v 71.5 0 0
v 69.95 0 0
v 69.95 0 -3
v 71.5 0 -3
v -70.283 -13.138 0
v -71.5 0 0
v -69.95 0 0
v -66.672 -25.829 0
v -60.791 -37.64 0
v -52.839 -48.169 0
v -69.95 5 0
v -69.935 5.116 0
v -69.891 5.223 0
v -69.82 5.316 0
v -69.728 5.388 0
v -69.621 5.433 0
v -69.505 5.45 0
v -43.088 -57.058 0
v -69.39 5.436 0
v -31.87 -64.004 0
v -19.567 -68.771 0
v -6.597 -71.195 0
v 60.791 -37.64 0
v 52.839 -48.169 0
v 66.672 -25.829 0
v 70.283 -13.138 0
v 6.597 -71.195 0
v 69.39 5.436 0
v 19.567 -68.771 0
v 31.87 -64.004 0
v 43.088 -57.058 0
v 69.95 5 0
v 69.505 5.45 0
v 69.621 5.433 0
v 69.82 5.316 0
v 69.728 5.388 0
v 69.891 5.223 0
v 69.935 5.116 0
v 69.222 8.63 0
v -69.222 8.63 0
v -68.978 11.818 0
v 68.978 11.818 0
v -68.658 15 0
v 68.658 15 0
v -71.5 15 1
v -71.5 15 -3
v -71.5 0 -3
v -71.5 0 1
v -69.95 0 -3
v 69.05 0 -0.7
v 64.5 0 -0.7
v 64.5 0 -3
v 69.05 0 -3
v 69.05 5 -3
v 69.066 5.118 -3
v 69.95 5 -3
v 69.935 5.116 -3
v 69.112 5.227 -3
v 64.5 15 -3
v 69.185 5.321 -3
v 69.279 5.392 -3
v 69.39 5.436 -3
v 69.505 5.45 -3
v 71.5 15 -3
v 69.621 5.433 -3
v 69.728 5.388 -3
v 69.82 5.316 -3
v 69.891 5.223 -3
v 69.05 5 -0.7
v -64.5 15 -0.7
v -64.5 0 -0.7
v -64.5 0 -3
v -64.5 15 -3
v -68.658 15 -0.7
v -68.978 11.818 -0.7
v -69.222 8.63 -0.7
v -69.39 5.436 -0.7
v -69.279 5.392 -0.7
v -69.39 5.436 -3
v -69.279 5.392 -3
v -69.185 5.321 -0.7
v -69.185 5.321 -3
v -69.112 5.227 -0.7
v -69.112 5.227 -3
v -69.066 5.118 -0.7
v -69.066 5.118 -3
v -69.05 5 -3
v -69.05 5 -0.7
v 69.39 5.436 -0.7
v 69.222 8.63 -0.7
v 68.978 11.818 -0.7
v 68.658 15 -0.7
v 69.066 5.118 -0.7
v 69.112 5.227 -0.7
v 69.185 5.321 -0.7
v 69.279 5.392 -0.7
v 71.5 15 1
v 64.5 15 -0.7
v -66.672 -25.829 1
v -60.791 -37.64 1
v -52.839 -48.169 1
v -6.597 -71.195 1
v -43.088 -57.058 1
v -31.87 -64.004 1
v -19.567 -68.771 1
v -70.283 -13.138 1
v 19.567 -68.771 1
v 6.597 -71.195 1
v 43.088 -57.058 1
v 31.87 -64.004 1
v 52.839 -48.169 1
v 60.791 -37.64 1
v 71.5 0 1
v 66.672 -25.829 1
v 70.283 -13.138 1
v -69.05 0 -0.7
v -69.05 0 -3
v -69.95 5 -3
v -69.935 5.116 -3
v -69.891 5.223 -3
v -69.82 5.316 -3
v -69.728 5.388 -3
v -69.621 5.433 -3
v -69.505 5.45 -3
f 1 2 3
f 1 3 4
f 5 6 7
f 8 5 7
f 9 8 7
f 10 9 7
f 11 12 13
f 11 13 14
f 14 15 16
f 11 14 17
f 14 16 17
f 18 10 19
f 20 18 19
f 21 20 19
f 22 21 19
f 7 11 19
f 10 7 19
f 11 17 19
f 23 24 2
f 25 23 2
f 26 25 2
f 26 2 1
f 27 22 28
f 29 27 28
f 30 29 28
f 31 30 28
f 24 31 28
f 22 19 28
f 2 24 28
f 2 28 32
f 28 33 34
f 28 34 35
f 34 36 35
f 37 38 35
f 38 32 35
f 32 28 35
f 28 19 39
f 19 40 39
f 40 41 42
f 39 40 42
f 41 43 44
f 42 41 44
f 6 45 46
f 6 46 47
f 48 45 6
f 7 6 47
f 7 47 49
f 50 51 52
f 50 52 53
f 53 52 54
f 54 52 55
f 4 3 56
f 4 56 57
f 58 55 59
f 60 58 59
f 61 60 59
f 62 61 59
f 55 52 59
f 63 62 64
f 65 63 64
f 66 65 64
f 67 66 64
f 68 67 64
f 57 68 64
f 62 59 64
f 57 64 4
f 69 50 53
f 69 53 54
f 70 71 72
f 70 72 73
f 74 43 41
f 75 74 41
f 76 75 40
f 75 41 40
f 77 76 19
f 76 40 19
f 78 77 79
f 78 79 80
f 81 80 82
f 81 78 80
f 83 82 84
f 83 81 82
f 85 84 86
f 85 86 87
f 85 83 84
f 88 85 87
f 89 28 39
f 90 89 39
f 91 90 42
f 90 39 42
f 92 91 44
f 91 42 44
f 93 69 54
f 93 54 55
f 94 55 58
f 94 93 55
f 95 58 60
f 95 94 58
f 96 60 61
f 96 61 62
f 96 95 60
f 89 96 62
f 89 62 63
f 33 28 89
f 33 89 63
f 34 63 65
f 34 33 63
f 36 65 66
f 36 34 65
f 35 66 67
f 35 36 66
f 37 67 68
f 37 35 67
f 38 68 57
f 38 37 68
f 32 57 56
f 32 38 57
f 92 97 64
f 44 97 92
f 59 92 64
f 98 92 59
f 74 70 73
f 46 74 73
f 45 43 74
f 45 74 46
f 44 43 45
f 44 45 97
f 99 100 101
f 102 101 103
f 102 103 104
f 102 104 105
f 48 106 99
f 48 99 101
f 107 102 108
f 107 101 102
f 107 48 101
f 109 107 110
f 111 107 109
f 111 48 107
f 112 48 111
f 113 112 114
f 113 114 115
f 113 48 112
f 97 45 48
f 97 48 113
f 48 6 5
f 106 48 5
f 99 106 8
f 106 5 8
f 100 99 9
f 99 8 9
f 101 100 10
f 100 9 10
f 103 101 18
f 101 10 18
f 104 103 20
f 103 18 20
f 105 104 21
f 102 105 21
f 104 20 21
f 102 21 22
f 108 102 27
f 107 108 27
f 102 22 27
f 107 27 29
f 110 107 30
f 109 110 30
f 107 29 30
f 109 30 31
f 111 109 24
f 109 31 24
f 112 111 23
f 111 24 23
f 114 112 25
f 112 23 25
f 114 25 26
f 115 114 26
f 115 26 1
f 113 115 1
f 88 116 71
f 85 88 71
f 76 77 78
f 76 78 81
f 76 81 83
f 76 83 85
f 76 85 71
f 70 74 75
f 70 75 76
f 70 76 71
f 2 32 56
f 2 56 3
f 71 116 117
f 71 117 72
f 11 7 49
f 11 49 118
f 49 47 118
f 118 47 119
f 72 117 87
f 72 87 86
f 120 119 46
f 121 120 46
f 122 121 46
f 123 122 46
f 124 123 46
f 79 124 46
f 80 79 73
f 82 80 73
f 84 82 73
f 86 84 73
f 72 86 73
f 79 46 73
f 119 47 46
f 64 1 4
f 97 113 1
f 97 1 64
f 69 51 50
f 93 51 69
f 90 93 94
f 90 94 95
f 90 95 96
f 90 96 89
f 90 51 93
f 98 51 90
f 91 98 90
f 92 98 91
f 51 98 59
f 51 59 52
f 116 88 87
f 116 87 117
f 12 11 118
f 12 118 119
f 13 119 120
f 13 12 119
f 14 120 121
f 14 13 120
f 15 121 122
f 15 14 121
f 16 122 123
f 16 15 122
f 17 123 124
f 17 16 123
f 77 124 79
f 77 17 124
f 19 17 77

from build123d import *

# Parameters (mm, degrees)
F1_DEPTH = 1
F2_DEPTH = 3
F3_DEPTH = 0.7


with BuildPart() as f1:
    # F0 (on Top) → F1 (new body)
    with BuildSketch(Plane.XY):
        with BuildLine():
            ThreePointArc((-69.95, 5), (-69.776457, 5.355066), (-69.389682, 5.436268))
            ThreePointArc((-69.389682, 5.436268), (-69.10934, 10.224685), (-68.657801, 15))
            Line((-68.657801, 15), (-71.5, 15))
            Line((-71.5, 15), (-71.5, 0))
            Line((-71.5, 0), (-69.95, 0))
            Line((-69.95, 0), (-69.95, 5))
        make_face()
        with BuildLine():
            ThreePointArc((-69.05, 5), (-69.144934, 5.276457), (-69.389682, 5.436268))
            ThreePointArc((-69.389682, 5.436268), (-69.776457, 5.355066), (-69.95, 5))
            Line((-69.95, 5), (-69.95, 0))
            Line((-69.95, 0), (-71.5, 0))
            ThreePointArc((-71.5, 0), (0, -71.5), (71.5, 0))
            Line((71.5, 0), (69.95, 0))
            Line((69.95, 0), (69.95, 5))
            ThreePointArc((69.95, 5), (69.776457, 5.355066), (69.389682, 5.436268))
            ThreePointArc((69.389682, 5.436268), (69.144934, 5.276457), (69.05, 5))
            Line((69.05, 5), (69.05, 0))
            Line((69.05, 0), (64.5, 0))
            Line((64.5, 0), (64.5, 15))
            Line((64.5, 15), (-64.5, 15))
            Line((-64.5, 15), (-64.5, 0))
            Line((-64.5, 0), (-69.05, 0))
            Line((-69.05, 0), (-69.05, 5))
        make_face()
        with BuildLine():
            Line((69.95, 0), (71.5, 0))
            Line((71.5, 0), (71.5, 15))
            Line((71.5, 15), (68.657801, 15))
            ThreePointArc((68.657801, 15), (69.10934, 10.224685), (69.389682, 5.436268))
            ThreePointArc((69.389682, 5.436268), (69.776457, 5.355066), (69.95, 5))
            Line((69.95, 5), (69.95, 0))
        make_face()
        with BuildLine():
            ThreePointArc((-68.657801, 15), (-69.10934, 10.224685), (-69.389682, 5.436268))
            ThreePointArc((-69.389682, 5.436268), (-69.144934, 5.276457), (-69.05, 5))
            Line((-69.05, 5), (-69.05, 0))
            Line((-69.05, 0), (-64.5, 0))
            Line((-64.5, 0), (-64.5, 15))
            Line((-64.5, 15), (-68.657801, 15))
        make_face()
        with BuildLine():
            Line((68.657801, 15), (64.5, 15))
            Line((64.5, 15), (64.5, 0))
            Line((64.5, 0), (69.05, 0))
            Line((69.05, 0), (69.05, 5))
            ThreePointArc((69.05, 5), (69.144934, 5.276457), (69.389682, 5.436268))
            ThreePointArc((69.389682, 5.436268), (69.10934, 10.224685), (68.657801, 15))
        make_face()
    extrude(amount=F1_DEPTH)

    # F0 (on Top) → F2 (join)
    with BuildSketch(Plane.XY):
        with BuildLine():
            Line((69.95, 0), (71.5, 0))
            Line((71.5, 0), (71.5, 15))
            Line((71.5, 15), (68.657801, 15))
            ThreePointArc((68.657801, 15), (69.10934, 10.224685), (69.389682, 5.436268))
            ThreePointArc((69.389682, 5.436268), (69.776457, 5.355066), (69.95, 5))
            Line((69.95, 5), (69.95, 0))
        make_face()
        with BuildLine():
            ThreePointArc((-69.95, 5), (-69.776457, 5.355066), (-69.389682, 5.436268))
            ThreePointArc((-69.389682, 5.436268), (-69.10934, 10.224685), (-68.657801, 15))
            Line((-68.657801, 15), (-71.5, 15))
            Line((-71.5, 15), (-71.5, 0))
            Line((-71.5, 0), (-69.95, 0))
            Line((-69.95, 0), (-69.95, 5))
        make_face()
        with BuildLine():
            ThreePointArc((-68.657801, 15), (-69.10934, 10.224685), (-69.389682, 5.436268))
            ThreePointArc((-69.389682, 5.436268), (-69.144934, 5.276457), (-69.05, 5))
            Line((-69.05, 5), (-69.05, 0))
            Line((-69.05, 0), (-64.5, 0))
            Line((-64.5, 0), (-64.5, 15))
            Line((-64.5, 15), (-68.657801, 15))
        make_face()
        with BuildLine():
            Line((68.657801, 15), (64.5, 15))
            Line((64.5, 15), (64.5, 0))
            Line((64.5, 0), (69.05, 0))
            Line((69.05, 0), (69.05, 5))
            ThreePointArc((69.05, 5), (69.144934, 5.276457), (69.389682, 5.436268))
            ThreePointArc((69.389682, 5.436268), (69.10934, 10.224685), (68.657801, 15))
        make_face()
    extrude(amount=-F2_DEPTH)

    # F0 (on Top) → F3 (cut)
    with BuildSketch(Plane.XY):
        with BuildLine():
            ThreePointArc((-68.657801, 15), (-69.10934, 10.224685), (-69.389682, 5.436268))
            ThreePointArc((-69.389682, 5.436268), (-69.144934, 5.276457), (-69.05, 5))
            Line((-69.05, 5), (-69.05, 0))
            Line((-69.05, 0), (-64.5, 0))
            Line((-64.5, 0), (-64.5, 15))
            Line((-64.5, 15), (-68.657801, 15))
        make_face()
        with BuildLine():
            Line((68.657801, 15), (64.5, 15))
            Line((64.5, 15), (64.5, 0))
            Line((64.5, 0), (69.05, 0))
            Line((69.05, 0), (69.05, 5))
            ThreePointArc((69.05, 5), (69.144934, 5.276457), (69.389682, 5.436268))
            ThreePointArc((69.389682, 5.436268), (69.10934, 10.224685), (68.657801, 15))
        make_face()
    extrude(amount=-F3_DEPTH, mode=Mode.SUBTRACT)


solid = f1.part
